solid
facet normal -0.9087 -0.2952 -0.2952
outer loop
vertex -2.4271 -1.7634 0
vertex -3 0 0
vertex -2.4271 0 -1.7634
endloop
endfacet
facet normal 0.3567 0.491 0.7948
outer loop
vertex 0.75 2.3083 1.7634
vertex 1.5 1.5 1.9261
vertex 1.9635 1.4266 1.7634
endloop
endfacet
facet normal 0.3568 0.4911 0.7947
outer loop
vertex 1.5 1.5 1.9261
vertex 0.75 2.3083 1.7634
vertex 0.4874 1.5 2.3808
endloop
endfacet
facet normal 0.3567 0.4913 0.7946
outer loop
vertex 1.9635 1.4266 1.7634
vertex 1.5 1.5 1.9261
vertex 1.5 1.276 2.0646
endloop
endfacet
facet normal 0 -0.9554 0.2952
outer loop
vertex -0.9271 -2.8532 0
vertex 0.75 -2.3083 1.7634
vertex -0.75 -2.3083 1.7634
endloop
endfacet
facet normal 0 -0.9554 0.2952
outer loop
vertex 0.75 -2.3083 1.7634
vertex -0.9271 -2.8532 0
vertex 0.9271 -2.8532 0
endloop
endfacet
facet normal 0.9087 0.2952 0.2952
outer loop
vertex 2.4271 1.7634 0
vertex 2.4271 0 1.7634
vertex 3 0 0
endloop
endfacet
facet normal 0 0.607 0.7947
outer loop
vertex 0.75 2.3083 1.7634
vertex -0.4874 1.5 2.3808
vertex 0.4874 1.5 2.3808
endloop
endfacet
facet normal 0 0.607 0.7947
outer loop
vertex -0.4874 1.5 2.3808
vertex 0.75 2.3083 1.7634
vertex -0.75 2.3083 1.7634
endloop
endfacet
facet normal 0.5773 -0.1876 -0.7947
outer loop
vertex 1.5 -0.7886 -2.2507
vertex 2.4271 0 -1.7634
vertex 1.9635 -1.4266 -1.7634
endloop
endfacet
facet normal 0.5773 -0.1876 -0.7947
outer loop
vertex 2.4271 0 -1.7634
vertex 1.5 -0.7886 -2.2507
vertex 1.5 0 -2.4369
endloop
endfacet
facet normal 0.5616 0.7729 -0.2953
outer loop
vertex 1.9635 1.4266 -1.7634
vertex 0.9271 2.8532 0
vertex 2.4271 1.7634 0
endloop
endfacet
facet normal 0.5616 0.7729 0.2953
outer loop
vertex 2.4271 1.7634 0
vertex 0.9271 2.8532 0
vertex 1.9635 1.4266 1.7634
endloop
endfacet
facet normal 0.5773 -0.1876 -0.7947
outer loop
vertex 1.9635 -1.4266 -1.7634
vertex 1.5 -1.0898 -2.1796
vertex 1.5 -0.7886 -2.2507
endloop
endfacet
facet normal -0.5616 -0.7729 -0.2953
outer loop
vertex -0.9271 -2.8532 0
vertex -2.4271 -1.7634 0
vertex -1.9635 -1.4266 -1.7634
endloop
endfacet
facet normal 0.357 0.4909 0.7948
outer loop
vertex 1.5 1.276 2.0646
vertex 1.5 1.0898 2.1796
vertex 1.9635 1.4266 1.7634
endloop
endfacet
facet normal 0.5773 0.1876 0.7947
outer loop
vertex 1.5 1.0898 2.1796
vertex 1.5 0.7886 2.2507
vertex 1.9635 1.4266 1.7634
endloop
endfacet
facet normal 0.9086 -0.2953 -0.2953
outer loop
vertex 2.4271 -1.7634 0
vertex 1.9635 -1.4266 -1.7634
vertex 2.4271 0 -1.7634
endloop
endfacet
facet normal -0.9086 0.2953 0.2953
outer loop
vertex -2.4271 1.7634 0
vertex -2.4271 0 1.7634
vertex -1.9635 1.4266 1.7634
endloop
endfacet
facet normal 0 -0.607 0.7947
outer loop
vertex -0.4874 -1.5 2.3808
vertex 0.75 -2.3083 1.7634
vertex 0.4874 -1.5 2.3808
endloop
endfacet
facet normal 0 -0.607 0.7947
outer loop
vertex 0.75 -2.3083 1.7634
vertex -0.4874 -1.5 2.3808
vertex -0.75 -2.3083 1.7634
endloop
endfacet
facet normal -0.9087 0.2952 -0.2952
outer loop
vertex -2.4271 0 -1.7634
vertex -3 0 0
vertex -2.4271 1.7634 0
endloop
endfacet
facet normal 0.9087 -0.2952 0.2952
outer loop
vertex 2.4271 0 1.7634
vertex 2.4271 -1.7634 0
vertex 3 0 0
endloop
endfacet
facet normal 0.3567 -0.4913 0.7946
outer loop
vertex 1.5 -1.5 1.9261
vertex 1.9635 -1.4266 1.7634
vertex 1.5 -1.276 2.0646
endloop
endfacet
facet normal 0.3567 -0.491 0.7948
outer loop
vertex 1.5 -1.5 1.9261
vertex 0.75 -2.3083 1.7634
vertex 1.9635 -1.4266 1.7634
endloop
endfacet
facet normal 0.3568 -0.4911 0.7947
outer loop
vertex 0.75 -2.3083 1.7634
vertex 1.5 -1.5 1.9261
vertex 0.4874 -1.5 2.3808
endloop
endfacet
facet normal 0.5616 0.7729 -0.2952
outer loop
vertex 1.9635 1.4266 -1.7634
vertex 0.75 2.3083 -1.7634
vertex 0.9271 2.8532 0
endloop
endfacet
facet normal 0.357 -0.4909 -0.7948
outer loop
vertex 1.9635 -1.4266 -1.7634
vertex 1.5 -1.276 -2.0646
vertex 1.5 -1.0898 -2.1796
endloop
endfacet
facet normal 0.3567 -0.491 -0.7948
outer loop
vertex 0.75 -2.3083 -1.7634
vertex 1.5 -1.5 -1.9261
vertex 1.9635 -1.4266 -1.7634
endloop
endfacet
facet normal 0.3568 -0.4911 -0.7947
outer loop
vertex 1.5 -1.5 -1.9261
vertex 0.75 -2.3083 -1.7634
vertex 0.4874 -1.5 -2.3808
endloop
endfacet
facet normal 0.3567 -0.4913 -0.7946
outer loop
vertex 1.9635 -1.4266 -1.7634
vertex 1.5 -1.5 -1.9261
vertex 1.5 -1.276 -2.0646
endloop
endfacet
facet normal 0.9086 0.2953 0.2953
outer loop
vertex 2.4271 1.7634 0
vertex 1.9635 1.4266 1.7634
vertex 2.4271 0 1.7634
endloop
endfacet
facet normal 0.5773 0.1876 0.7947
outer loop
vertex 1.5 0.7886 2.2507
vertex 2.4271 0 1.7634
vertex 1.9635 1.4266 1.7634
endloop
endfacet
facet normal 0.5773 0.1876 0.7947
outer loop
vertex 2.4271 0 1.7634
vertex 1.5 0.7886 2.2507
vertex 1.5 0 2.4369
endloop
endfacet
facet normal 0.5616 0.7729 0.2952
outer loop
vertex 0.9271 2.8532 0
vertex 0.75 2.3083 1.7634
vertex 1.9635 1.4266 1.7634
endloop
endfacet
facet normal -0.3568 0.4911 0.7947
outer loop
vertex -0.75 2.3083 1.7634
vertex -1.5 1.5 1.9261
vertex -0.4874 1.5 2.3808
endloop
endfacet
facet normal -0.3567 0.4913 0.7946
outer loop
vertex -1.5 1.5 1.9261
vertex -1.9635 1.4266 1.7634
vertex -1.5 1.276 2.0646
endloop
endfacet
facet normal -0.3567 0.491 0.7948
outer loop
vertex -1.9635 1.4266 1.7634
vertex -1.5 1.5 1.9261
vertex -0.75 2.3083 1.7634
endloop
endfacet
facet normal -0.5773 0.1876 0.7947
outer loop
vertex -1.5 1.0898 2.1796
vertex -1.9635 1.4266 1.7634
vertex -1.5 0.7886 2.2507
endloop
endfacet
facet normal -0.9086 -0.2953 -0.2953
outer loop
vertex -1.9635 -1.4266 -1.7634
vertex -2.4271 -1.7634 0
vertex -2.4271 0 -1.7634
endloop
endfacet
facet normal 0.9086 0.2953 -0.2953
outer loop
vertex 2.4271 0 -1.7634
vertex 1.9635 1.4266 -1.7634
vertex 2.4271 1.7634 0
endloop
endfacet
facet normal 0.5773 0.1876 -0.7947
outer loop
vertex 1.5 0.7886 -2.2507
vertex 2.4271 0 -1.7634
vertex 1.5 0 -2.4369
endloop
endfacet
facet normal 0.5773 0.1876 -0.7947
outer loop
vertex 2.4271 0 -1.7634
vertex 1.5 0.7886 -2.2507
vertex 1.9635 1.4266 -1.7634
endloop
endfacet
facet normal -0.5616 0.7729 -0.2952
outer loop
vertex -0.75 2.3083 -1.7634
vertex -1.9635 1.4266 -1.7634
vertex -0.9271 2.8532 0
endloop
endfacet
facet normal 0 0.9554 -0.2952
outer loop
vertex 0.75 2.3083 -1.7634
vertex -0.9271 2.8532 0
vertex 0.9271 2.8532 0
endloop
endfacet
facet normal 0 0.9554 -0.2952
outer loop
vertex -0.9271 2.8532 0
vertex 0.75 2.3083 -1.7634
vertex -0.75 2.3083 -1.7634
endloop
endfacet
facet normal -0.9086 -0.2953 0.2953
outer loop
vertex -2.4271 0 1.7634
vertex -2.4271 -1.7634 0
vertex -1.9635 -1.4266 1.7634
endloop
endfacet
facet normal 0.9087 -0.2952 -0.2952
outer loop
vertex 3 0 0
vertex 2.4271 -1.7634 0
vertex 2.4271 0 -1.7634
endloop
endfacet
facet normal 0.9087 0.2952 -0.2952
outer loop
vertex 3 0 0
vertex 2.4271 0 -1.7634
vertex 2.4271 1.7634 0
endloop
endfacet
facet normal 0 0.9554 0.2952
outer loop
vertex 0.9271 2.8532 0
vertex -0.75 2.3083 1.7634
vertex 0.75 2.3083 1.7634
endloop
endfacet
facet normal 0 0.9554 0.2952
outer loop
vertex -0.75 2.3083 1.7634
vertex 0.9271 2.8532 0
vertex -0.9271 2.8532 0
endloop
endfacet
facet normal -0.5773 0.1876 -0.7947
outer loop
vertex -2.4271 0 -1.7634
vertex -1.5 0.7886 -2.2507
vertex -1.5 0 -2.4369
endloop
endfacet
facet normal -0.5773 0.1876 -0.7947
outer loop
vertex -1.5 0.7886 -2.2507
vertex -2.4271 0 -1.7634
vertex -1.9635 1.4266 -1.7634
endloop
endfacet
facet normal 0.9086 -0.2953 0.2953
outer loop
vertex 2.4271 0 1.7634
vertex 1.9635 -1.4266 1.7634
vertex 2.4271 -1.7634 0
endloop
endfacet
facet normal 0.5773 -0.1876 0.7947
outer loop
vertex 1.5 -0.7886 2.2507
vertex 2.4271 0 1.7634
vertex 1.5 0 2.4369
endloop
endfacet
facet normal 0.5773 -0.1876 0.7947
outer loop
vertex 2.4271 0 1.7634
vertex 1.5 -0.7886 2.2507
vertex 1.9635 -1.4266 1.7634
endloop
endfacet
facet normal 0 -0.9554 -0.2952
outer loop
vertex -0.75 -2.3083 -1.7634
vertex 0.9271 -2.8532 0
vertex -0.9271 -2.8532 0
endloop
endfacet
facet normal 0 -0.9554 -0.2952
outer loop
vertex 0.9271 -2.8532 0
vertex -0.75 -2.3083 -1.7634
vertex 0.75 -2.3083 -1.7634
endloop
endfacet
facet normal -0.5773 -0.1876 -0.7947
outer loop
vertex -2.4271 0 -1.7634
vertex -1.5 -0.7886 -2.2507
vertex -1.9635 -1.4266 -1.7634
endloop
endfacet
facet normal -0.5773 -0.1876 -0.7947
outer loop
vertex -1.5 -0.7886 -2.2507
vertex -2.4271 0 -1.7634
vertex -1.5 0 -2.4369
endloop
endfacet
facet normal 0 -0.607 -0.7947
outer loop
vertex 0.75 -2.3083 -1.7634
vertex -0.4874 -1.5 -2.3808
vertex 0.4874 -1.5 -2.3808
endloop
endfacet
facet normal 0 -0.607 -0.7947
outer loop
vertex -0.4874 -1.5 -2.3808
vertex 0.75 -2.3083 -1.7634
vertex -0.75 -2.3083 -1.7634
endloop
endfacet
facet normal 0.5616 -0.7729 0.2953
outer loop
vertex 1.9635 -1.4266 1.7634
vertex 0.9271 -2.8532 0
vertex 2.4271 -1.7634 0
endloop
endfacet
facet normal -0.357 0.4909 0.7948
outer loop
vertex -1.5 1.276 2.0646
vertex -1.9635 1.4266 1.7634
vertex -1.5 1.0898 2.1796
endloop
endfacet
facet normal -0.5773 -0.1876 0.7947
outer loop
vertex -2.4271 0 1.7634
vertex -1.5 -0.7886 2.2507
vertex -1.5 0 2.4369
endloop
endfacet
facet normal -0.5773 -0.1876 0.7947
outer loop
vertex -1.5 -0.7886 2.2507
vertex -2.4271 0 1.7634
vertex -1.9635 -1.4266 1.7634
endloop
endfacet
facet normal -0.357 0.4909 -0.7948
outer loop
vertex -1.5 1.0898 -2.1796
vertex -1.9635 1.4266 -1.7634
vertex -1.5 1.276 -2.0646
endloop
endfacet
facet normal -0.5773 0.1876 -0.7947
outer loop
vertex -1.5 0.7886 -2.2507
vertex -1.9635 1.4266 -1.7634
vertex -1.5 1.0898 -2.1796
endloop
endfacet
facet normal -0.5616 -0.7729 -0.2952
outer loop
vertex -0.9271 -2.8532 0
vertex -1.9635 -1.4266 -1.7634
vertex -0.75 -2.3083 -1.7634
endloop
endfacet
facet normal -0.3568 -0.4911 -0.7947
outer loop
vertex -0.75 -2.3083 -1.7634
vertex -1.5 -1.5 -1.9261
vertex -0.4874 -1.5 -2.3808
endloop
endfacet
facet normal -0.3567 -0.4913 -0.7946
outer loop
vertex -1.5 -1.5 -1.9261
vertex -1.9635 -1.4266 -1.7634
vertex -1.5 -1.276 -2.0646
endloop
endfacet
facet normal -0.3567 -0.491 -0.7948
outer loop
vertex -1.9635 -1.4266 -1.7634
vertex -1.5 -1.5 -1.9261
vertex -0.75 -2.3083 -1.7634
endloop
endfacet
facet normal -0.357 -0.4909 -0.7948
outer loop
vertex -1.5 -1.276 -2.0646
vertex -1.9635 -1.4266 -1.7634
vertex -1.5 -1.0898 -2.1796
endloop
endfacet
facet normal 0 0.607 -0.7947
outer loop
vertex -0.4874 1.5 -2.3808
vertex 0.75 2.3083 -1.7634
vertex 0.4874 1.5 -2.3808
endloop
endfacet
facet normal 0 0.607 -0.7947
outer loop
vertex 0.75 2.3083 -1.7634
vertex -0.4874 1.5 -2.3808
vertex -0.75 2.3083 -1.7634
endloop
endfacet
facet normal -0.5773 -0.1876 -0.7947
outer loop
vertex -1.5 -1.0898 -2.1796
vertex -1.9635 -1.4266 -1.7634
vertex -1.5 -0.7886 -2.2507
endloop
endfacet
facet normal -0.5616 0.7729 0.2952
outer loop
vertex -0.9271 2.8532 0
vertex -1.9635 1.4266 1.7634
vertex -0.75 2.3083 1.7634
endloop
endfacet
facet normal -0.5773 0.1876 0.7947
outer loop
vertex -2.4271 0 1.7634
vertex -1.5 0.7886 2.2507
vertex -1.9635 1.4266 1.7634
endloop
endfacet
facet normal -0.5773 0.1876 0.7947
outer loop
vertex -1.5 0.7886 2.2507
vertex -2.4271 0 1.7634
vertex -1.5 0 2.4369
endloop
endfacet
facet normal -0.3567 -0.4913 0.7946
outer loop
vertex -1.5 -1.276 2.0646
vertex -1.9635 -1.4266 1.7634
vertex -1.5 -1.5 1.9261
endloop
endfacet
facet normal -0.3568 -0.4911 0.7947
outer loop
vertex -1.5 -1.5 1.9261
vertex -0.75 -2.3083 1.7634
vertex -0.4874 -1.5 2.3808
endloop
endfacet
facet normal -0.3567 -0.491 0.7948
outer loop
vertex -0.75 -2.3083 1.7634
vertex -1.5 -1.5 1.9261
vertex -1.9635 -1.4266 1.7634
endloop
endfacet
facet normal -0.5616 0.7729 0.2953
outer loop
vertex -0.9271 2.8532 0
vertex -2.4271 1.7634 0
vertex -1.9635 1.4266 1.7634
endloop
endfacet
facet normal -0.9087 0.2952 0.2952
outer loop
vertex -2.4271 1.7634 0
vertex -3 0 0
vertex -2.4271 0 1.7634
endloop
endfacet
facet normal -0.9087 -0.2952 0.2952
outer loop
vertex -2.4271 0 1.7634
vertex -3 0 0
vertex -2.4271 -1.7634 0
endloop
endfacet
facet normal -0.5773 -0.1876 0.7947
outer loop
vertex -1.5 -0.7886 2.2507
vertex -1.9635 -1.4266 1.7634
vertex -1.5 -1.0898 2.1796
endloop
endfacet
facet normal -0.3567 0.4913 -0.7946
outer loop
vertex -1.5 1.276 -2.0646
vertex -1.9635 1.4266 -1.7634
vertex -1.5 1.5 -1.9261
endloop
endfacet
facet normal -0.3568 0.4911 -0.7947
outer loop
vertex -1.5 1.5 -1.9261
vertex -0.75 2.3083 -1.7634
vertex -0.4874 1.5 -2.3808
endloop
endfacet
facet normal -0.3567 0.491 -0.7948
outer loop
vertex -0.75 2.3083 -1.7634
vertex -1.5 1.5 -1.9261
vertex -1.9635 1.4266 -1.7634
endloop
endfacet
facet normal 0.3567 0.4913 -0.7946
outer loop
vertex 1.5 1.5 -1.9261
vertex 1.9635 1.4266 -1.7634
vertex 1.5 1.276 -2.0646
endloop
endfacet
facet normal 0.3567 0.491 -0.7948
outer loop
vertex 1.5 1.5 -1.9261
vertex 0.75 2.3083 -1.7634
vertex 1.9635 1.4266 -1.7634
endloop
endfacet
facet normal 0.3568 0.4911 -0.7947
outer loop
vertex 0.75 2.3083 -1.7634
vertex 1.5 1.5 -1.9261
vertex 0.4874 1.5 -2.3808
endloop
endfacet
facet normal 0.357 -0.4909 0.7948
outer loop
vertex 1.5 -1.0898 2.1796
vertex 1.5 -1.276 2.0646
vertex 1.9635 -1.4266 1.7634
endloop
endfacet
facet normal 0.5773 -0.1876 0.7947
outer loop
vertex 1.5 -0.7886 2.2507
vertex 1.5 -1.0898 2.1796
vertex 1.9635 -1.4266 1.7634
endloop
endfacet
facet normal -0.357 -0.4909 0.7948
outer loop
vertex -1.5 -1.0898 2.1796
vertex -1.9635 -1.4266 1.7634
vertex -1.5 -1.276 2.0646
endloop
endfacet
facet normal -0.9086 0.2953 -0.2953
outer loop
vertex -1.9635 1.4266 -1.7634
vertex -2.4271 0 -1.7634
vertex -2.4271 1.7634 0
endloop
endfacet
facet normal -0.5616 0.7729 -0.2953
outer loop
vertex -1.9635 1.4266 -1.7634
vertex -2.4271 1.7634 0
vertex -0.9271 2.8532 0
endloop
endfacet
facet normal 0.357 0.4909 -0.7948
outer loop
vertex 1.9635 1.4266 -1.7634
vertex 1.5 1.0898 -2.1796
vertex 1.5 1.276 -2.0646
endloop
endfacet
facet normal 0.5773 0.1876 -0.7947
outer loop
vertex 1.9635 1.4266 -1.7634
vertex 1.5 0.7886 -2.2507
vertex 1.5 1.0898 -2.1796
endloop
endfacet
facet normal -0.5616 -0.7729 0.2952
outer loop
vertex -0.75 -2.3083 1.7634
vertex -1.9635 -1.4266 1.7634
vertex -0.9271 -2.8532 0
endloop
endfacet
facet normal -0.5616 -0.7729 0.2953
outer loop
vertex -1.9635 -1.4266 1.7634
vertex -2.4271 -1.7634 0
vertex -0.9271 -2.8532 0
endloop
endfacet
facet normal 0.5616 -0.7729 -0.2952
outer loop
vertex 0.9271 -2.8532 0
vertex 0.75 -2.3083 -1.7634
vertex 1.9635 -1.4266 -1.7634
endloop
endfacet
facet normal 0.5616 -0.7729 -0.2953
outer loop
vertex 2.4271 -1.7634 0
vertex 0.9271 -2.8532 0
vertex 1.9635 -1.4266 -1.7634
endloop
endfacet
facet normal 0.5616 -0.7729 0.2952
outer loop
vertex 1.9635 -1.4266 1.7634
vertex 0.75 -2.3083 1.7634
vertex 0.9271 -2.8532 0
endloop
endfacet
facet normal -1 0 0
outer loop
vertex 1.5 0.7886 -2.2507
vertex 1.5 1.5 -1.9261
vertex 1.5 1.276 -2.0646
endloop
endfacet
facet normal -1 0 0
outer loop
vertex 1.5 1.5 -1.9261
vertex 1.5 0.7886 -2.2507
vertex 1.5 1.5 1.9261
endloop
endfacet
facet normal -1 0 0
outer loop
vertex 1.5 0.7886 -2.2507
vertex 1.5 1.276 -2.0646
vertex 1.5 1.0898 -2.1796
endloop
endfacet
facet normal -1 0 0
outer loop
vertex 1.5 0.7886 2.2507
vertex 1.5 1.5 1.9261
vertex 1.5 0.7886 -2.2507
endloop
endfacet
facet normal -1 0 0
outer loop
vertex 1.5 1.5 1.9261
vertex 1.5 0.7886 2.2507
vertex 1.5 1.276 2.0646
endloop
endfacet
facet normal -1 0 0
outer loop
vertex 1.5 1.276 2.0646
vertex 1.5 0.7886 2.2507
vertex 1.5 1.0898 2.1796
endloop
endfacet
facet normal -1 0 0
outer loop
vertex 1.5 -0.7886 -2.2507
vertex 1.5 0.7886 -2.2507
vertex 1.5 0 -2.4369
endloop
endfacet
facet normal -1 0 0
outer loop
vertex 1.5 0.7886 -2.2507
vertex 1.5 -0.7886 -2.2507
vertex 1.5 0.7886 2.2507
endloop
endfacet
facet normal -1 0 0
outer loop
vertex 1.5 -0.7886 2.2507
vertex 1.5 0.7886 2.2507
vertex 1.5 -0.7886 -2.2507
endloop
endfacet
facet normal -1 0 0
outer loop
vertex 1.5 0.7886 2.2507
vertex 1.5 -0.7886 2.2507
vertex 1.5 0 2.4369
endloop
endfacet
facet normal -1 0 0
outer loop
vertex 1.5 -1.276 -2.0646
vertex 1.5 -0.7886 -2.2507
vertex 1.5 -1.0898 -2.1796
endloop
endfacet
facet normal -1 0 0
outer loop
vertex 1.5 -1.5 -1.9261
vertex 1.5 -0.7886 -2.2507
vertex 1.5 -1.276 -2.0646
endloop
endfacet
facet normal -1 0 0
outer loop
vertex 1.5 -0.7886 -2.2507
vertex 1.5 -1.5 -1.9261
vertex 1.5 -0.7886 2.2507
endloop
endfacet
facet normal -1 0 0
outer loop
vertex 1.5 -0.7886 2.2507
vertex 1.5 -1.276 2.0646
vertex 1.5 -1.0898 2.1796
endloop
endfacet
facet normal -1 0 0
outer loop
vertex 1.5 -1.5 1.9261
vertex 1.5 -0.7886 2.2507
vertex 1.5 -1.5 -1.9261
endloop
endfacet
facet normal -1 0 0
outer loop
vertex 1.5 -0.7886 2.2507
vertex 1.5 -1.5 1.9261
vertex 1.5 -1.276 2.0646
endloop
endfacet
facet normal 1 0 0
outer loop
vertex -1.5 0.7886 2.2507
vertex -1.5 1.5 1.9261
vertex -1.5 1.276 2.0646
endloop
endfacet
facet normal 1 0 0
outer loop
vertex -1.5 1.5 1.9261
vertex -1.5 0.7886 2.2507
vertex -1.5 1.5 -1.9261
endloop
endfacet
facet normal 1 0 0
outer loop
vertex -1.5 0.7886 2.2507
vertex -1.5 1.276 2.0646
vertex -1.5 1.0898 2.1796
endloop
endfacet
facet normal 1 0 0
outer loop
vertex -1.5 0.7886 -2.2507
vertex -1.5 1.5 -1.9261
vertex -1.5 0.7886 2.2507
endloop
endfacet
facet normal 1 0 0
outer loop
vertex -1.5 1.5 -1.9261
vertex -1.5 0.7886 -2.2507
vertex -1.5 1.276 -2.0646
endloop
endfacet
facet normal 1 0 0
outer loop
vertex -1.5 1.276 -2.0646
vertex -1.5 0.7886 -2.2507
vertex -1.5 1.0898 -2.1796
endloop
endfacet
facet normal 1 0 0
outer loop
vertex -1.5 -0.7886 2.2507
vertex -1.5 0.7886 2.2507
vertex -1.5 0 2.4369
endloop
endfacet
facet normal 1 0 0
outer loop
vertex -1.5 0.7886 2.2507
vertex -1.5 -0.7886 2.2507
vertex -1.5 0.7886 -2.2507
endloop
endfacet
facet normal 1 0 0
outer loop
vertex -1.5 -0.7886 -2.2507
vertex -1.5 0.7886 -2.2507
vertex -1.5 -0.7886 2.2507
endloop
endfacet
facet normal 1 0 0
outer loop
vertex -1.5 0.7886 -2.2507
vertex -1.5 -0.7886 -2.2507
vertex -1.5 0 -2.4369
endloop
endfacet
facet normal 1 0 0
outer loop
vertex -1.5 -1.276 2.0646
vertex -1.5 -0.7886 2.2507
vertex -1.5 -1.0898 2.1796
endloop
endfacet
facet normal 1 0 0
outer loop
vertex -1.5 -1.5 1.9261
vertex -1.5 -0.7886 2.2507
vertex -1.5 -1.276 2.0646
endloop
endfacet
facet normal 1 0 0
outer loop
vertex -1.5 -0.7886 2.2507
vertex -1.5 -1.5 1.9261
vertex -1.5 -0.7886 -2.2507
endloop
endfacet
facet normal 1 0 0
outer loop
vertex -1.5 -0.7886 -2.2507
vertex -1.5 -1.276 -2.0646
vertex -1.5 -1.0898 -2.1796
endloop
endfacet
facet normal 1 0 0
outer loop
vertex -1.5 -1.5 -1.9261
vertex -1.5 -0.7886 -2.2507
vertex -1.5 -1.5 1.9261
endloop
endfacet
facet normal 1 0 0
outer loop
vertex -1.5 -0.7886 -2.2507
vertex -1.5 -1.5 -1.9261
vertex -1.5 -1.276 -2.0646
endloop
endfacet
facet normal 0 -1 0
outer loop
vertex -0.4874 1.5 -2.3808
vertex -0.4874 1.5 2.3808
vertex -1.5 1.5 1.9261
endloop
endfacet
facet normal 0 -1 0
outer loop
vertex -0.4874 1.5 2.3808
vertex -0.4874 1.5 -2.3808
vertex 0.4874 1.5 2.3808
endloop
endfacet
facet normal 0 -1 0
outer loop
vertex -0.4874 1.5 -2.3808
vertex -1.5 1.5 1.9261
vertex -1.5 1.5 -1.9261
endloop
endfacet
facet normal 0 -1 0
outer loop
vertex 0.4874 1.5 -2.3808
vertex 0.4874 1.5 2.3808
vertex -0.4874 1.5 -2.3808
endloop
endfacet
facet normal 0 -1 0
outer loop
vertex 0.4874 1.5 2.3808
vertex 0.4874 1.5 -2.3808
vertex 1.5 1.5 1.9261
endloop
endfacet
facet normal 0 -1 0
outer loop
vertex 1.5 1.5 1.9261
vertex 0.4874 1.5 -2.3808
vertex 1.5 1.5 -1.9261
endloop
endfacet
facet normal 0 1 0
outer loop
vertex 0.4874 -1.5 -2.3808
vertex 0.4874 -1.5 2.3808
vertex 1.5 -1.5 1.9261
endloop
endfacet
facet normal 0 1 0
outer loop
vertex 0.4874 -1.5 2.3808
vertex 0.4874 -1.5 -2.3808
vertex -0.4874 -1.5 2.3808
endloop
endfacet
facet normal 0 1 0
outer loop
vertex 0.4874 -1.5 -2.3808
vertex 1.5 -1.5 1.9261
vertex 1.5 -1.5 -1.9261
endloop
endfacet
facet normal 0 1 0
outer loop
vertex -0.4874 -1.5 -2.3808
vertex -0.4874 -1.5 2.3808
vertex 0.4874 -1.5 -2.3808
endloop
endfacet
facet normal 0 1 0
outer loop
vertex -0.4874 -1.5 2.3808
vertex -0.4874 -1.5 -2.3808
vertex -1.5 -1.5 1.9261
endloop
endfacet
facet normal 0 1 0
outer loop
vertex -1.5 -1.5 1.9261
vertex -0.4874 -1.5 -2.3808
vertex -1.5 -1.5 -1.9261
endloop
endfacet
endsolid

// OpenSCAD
difference() {
  sphere(3);
  cube([3,3,8], center=true);
}
